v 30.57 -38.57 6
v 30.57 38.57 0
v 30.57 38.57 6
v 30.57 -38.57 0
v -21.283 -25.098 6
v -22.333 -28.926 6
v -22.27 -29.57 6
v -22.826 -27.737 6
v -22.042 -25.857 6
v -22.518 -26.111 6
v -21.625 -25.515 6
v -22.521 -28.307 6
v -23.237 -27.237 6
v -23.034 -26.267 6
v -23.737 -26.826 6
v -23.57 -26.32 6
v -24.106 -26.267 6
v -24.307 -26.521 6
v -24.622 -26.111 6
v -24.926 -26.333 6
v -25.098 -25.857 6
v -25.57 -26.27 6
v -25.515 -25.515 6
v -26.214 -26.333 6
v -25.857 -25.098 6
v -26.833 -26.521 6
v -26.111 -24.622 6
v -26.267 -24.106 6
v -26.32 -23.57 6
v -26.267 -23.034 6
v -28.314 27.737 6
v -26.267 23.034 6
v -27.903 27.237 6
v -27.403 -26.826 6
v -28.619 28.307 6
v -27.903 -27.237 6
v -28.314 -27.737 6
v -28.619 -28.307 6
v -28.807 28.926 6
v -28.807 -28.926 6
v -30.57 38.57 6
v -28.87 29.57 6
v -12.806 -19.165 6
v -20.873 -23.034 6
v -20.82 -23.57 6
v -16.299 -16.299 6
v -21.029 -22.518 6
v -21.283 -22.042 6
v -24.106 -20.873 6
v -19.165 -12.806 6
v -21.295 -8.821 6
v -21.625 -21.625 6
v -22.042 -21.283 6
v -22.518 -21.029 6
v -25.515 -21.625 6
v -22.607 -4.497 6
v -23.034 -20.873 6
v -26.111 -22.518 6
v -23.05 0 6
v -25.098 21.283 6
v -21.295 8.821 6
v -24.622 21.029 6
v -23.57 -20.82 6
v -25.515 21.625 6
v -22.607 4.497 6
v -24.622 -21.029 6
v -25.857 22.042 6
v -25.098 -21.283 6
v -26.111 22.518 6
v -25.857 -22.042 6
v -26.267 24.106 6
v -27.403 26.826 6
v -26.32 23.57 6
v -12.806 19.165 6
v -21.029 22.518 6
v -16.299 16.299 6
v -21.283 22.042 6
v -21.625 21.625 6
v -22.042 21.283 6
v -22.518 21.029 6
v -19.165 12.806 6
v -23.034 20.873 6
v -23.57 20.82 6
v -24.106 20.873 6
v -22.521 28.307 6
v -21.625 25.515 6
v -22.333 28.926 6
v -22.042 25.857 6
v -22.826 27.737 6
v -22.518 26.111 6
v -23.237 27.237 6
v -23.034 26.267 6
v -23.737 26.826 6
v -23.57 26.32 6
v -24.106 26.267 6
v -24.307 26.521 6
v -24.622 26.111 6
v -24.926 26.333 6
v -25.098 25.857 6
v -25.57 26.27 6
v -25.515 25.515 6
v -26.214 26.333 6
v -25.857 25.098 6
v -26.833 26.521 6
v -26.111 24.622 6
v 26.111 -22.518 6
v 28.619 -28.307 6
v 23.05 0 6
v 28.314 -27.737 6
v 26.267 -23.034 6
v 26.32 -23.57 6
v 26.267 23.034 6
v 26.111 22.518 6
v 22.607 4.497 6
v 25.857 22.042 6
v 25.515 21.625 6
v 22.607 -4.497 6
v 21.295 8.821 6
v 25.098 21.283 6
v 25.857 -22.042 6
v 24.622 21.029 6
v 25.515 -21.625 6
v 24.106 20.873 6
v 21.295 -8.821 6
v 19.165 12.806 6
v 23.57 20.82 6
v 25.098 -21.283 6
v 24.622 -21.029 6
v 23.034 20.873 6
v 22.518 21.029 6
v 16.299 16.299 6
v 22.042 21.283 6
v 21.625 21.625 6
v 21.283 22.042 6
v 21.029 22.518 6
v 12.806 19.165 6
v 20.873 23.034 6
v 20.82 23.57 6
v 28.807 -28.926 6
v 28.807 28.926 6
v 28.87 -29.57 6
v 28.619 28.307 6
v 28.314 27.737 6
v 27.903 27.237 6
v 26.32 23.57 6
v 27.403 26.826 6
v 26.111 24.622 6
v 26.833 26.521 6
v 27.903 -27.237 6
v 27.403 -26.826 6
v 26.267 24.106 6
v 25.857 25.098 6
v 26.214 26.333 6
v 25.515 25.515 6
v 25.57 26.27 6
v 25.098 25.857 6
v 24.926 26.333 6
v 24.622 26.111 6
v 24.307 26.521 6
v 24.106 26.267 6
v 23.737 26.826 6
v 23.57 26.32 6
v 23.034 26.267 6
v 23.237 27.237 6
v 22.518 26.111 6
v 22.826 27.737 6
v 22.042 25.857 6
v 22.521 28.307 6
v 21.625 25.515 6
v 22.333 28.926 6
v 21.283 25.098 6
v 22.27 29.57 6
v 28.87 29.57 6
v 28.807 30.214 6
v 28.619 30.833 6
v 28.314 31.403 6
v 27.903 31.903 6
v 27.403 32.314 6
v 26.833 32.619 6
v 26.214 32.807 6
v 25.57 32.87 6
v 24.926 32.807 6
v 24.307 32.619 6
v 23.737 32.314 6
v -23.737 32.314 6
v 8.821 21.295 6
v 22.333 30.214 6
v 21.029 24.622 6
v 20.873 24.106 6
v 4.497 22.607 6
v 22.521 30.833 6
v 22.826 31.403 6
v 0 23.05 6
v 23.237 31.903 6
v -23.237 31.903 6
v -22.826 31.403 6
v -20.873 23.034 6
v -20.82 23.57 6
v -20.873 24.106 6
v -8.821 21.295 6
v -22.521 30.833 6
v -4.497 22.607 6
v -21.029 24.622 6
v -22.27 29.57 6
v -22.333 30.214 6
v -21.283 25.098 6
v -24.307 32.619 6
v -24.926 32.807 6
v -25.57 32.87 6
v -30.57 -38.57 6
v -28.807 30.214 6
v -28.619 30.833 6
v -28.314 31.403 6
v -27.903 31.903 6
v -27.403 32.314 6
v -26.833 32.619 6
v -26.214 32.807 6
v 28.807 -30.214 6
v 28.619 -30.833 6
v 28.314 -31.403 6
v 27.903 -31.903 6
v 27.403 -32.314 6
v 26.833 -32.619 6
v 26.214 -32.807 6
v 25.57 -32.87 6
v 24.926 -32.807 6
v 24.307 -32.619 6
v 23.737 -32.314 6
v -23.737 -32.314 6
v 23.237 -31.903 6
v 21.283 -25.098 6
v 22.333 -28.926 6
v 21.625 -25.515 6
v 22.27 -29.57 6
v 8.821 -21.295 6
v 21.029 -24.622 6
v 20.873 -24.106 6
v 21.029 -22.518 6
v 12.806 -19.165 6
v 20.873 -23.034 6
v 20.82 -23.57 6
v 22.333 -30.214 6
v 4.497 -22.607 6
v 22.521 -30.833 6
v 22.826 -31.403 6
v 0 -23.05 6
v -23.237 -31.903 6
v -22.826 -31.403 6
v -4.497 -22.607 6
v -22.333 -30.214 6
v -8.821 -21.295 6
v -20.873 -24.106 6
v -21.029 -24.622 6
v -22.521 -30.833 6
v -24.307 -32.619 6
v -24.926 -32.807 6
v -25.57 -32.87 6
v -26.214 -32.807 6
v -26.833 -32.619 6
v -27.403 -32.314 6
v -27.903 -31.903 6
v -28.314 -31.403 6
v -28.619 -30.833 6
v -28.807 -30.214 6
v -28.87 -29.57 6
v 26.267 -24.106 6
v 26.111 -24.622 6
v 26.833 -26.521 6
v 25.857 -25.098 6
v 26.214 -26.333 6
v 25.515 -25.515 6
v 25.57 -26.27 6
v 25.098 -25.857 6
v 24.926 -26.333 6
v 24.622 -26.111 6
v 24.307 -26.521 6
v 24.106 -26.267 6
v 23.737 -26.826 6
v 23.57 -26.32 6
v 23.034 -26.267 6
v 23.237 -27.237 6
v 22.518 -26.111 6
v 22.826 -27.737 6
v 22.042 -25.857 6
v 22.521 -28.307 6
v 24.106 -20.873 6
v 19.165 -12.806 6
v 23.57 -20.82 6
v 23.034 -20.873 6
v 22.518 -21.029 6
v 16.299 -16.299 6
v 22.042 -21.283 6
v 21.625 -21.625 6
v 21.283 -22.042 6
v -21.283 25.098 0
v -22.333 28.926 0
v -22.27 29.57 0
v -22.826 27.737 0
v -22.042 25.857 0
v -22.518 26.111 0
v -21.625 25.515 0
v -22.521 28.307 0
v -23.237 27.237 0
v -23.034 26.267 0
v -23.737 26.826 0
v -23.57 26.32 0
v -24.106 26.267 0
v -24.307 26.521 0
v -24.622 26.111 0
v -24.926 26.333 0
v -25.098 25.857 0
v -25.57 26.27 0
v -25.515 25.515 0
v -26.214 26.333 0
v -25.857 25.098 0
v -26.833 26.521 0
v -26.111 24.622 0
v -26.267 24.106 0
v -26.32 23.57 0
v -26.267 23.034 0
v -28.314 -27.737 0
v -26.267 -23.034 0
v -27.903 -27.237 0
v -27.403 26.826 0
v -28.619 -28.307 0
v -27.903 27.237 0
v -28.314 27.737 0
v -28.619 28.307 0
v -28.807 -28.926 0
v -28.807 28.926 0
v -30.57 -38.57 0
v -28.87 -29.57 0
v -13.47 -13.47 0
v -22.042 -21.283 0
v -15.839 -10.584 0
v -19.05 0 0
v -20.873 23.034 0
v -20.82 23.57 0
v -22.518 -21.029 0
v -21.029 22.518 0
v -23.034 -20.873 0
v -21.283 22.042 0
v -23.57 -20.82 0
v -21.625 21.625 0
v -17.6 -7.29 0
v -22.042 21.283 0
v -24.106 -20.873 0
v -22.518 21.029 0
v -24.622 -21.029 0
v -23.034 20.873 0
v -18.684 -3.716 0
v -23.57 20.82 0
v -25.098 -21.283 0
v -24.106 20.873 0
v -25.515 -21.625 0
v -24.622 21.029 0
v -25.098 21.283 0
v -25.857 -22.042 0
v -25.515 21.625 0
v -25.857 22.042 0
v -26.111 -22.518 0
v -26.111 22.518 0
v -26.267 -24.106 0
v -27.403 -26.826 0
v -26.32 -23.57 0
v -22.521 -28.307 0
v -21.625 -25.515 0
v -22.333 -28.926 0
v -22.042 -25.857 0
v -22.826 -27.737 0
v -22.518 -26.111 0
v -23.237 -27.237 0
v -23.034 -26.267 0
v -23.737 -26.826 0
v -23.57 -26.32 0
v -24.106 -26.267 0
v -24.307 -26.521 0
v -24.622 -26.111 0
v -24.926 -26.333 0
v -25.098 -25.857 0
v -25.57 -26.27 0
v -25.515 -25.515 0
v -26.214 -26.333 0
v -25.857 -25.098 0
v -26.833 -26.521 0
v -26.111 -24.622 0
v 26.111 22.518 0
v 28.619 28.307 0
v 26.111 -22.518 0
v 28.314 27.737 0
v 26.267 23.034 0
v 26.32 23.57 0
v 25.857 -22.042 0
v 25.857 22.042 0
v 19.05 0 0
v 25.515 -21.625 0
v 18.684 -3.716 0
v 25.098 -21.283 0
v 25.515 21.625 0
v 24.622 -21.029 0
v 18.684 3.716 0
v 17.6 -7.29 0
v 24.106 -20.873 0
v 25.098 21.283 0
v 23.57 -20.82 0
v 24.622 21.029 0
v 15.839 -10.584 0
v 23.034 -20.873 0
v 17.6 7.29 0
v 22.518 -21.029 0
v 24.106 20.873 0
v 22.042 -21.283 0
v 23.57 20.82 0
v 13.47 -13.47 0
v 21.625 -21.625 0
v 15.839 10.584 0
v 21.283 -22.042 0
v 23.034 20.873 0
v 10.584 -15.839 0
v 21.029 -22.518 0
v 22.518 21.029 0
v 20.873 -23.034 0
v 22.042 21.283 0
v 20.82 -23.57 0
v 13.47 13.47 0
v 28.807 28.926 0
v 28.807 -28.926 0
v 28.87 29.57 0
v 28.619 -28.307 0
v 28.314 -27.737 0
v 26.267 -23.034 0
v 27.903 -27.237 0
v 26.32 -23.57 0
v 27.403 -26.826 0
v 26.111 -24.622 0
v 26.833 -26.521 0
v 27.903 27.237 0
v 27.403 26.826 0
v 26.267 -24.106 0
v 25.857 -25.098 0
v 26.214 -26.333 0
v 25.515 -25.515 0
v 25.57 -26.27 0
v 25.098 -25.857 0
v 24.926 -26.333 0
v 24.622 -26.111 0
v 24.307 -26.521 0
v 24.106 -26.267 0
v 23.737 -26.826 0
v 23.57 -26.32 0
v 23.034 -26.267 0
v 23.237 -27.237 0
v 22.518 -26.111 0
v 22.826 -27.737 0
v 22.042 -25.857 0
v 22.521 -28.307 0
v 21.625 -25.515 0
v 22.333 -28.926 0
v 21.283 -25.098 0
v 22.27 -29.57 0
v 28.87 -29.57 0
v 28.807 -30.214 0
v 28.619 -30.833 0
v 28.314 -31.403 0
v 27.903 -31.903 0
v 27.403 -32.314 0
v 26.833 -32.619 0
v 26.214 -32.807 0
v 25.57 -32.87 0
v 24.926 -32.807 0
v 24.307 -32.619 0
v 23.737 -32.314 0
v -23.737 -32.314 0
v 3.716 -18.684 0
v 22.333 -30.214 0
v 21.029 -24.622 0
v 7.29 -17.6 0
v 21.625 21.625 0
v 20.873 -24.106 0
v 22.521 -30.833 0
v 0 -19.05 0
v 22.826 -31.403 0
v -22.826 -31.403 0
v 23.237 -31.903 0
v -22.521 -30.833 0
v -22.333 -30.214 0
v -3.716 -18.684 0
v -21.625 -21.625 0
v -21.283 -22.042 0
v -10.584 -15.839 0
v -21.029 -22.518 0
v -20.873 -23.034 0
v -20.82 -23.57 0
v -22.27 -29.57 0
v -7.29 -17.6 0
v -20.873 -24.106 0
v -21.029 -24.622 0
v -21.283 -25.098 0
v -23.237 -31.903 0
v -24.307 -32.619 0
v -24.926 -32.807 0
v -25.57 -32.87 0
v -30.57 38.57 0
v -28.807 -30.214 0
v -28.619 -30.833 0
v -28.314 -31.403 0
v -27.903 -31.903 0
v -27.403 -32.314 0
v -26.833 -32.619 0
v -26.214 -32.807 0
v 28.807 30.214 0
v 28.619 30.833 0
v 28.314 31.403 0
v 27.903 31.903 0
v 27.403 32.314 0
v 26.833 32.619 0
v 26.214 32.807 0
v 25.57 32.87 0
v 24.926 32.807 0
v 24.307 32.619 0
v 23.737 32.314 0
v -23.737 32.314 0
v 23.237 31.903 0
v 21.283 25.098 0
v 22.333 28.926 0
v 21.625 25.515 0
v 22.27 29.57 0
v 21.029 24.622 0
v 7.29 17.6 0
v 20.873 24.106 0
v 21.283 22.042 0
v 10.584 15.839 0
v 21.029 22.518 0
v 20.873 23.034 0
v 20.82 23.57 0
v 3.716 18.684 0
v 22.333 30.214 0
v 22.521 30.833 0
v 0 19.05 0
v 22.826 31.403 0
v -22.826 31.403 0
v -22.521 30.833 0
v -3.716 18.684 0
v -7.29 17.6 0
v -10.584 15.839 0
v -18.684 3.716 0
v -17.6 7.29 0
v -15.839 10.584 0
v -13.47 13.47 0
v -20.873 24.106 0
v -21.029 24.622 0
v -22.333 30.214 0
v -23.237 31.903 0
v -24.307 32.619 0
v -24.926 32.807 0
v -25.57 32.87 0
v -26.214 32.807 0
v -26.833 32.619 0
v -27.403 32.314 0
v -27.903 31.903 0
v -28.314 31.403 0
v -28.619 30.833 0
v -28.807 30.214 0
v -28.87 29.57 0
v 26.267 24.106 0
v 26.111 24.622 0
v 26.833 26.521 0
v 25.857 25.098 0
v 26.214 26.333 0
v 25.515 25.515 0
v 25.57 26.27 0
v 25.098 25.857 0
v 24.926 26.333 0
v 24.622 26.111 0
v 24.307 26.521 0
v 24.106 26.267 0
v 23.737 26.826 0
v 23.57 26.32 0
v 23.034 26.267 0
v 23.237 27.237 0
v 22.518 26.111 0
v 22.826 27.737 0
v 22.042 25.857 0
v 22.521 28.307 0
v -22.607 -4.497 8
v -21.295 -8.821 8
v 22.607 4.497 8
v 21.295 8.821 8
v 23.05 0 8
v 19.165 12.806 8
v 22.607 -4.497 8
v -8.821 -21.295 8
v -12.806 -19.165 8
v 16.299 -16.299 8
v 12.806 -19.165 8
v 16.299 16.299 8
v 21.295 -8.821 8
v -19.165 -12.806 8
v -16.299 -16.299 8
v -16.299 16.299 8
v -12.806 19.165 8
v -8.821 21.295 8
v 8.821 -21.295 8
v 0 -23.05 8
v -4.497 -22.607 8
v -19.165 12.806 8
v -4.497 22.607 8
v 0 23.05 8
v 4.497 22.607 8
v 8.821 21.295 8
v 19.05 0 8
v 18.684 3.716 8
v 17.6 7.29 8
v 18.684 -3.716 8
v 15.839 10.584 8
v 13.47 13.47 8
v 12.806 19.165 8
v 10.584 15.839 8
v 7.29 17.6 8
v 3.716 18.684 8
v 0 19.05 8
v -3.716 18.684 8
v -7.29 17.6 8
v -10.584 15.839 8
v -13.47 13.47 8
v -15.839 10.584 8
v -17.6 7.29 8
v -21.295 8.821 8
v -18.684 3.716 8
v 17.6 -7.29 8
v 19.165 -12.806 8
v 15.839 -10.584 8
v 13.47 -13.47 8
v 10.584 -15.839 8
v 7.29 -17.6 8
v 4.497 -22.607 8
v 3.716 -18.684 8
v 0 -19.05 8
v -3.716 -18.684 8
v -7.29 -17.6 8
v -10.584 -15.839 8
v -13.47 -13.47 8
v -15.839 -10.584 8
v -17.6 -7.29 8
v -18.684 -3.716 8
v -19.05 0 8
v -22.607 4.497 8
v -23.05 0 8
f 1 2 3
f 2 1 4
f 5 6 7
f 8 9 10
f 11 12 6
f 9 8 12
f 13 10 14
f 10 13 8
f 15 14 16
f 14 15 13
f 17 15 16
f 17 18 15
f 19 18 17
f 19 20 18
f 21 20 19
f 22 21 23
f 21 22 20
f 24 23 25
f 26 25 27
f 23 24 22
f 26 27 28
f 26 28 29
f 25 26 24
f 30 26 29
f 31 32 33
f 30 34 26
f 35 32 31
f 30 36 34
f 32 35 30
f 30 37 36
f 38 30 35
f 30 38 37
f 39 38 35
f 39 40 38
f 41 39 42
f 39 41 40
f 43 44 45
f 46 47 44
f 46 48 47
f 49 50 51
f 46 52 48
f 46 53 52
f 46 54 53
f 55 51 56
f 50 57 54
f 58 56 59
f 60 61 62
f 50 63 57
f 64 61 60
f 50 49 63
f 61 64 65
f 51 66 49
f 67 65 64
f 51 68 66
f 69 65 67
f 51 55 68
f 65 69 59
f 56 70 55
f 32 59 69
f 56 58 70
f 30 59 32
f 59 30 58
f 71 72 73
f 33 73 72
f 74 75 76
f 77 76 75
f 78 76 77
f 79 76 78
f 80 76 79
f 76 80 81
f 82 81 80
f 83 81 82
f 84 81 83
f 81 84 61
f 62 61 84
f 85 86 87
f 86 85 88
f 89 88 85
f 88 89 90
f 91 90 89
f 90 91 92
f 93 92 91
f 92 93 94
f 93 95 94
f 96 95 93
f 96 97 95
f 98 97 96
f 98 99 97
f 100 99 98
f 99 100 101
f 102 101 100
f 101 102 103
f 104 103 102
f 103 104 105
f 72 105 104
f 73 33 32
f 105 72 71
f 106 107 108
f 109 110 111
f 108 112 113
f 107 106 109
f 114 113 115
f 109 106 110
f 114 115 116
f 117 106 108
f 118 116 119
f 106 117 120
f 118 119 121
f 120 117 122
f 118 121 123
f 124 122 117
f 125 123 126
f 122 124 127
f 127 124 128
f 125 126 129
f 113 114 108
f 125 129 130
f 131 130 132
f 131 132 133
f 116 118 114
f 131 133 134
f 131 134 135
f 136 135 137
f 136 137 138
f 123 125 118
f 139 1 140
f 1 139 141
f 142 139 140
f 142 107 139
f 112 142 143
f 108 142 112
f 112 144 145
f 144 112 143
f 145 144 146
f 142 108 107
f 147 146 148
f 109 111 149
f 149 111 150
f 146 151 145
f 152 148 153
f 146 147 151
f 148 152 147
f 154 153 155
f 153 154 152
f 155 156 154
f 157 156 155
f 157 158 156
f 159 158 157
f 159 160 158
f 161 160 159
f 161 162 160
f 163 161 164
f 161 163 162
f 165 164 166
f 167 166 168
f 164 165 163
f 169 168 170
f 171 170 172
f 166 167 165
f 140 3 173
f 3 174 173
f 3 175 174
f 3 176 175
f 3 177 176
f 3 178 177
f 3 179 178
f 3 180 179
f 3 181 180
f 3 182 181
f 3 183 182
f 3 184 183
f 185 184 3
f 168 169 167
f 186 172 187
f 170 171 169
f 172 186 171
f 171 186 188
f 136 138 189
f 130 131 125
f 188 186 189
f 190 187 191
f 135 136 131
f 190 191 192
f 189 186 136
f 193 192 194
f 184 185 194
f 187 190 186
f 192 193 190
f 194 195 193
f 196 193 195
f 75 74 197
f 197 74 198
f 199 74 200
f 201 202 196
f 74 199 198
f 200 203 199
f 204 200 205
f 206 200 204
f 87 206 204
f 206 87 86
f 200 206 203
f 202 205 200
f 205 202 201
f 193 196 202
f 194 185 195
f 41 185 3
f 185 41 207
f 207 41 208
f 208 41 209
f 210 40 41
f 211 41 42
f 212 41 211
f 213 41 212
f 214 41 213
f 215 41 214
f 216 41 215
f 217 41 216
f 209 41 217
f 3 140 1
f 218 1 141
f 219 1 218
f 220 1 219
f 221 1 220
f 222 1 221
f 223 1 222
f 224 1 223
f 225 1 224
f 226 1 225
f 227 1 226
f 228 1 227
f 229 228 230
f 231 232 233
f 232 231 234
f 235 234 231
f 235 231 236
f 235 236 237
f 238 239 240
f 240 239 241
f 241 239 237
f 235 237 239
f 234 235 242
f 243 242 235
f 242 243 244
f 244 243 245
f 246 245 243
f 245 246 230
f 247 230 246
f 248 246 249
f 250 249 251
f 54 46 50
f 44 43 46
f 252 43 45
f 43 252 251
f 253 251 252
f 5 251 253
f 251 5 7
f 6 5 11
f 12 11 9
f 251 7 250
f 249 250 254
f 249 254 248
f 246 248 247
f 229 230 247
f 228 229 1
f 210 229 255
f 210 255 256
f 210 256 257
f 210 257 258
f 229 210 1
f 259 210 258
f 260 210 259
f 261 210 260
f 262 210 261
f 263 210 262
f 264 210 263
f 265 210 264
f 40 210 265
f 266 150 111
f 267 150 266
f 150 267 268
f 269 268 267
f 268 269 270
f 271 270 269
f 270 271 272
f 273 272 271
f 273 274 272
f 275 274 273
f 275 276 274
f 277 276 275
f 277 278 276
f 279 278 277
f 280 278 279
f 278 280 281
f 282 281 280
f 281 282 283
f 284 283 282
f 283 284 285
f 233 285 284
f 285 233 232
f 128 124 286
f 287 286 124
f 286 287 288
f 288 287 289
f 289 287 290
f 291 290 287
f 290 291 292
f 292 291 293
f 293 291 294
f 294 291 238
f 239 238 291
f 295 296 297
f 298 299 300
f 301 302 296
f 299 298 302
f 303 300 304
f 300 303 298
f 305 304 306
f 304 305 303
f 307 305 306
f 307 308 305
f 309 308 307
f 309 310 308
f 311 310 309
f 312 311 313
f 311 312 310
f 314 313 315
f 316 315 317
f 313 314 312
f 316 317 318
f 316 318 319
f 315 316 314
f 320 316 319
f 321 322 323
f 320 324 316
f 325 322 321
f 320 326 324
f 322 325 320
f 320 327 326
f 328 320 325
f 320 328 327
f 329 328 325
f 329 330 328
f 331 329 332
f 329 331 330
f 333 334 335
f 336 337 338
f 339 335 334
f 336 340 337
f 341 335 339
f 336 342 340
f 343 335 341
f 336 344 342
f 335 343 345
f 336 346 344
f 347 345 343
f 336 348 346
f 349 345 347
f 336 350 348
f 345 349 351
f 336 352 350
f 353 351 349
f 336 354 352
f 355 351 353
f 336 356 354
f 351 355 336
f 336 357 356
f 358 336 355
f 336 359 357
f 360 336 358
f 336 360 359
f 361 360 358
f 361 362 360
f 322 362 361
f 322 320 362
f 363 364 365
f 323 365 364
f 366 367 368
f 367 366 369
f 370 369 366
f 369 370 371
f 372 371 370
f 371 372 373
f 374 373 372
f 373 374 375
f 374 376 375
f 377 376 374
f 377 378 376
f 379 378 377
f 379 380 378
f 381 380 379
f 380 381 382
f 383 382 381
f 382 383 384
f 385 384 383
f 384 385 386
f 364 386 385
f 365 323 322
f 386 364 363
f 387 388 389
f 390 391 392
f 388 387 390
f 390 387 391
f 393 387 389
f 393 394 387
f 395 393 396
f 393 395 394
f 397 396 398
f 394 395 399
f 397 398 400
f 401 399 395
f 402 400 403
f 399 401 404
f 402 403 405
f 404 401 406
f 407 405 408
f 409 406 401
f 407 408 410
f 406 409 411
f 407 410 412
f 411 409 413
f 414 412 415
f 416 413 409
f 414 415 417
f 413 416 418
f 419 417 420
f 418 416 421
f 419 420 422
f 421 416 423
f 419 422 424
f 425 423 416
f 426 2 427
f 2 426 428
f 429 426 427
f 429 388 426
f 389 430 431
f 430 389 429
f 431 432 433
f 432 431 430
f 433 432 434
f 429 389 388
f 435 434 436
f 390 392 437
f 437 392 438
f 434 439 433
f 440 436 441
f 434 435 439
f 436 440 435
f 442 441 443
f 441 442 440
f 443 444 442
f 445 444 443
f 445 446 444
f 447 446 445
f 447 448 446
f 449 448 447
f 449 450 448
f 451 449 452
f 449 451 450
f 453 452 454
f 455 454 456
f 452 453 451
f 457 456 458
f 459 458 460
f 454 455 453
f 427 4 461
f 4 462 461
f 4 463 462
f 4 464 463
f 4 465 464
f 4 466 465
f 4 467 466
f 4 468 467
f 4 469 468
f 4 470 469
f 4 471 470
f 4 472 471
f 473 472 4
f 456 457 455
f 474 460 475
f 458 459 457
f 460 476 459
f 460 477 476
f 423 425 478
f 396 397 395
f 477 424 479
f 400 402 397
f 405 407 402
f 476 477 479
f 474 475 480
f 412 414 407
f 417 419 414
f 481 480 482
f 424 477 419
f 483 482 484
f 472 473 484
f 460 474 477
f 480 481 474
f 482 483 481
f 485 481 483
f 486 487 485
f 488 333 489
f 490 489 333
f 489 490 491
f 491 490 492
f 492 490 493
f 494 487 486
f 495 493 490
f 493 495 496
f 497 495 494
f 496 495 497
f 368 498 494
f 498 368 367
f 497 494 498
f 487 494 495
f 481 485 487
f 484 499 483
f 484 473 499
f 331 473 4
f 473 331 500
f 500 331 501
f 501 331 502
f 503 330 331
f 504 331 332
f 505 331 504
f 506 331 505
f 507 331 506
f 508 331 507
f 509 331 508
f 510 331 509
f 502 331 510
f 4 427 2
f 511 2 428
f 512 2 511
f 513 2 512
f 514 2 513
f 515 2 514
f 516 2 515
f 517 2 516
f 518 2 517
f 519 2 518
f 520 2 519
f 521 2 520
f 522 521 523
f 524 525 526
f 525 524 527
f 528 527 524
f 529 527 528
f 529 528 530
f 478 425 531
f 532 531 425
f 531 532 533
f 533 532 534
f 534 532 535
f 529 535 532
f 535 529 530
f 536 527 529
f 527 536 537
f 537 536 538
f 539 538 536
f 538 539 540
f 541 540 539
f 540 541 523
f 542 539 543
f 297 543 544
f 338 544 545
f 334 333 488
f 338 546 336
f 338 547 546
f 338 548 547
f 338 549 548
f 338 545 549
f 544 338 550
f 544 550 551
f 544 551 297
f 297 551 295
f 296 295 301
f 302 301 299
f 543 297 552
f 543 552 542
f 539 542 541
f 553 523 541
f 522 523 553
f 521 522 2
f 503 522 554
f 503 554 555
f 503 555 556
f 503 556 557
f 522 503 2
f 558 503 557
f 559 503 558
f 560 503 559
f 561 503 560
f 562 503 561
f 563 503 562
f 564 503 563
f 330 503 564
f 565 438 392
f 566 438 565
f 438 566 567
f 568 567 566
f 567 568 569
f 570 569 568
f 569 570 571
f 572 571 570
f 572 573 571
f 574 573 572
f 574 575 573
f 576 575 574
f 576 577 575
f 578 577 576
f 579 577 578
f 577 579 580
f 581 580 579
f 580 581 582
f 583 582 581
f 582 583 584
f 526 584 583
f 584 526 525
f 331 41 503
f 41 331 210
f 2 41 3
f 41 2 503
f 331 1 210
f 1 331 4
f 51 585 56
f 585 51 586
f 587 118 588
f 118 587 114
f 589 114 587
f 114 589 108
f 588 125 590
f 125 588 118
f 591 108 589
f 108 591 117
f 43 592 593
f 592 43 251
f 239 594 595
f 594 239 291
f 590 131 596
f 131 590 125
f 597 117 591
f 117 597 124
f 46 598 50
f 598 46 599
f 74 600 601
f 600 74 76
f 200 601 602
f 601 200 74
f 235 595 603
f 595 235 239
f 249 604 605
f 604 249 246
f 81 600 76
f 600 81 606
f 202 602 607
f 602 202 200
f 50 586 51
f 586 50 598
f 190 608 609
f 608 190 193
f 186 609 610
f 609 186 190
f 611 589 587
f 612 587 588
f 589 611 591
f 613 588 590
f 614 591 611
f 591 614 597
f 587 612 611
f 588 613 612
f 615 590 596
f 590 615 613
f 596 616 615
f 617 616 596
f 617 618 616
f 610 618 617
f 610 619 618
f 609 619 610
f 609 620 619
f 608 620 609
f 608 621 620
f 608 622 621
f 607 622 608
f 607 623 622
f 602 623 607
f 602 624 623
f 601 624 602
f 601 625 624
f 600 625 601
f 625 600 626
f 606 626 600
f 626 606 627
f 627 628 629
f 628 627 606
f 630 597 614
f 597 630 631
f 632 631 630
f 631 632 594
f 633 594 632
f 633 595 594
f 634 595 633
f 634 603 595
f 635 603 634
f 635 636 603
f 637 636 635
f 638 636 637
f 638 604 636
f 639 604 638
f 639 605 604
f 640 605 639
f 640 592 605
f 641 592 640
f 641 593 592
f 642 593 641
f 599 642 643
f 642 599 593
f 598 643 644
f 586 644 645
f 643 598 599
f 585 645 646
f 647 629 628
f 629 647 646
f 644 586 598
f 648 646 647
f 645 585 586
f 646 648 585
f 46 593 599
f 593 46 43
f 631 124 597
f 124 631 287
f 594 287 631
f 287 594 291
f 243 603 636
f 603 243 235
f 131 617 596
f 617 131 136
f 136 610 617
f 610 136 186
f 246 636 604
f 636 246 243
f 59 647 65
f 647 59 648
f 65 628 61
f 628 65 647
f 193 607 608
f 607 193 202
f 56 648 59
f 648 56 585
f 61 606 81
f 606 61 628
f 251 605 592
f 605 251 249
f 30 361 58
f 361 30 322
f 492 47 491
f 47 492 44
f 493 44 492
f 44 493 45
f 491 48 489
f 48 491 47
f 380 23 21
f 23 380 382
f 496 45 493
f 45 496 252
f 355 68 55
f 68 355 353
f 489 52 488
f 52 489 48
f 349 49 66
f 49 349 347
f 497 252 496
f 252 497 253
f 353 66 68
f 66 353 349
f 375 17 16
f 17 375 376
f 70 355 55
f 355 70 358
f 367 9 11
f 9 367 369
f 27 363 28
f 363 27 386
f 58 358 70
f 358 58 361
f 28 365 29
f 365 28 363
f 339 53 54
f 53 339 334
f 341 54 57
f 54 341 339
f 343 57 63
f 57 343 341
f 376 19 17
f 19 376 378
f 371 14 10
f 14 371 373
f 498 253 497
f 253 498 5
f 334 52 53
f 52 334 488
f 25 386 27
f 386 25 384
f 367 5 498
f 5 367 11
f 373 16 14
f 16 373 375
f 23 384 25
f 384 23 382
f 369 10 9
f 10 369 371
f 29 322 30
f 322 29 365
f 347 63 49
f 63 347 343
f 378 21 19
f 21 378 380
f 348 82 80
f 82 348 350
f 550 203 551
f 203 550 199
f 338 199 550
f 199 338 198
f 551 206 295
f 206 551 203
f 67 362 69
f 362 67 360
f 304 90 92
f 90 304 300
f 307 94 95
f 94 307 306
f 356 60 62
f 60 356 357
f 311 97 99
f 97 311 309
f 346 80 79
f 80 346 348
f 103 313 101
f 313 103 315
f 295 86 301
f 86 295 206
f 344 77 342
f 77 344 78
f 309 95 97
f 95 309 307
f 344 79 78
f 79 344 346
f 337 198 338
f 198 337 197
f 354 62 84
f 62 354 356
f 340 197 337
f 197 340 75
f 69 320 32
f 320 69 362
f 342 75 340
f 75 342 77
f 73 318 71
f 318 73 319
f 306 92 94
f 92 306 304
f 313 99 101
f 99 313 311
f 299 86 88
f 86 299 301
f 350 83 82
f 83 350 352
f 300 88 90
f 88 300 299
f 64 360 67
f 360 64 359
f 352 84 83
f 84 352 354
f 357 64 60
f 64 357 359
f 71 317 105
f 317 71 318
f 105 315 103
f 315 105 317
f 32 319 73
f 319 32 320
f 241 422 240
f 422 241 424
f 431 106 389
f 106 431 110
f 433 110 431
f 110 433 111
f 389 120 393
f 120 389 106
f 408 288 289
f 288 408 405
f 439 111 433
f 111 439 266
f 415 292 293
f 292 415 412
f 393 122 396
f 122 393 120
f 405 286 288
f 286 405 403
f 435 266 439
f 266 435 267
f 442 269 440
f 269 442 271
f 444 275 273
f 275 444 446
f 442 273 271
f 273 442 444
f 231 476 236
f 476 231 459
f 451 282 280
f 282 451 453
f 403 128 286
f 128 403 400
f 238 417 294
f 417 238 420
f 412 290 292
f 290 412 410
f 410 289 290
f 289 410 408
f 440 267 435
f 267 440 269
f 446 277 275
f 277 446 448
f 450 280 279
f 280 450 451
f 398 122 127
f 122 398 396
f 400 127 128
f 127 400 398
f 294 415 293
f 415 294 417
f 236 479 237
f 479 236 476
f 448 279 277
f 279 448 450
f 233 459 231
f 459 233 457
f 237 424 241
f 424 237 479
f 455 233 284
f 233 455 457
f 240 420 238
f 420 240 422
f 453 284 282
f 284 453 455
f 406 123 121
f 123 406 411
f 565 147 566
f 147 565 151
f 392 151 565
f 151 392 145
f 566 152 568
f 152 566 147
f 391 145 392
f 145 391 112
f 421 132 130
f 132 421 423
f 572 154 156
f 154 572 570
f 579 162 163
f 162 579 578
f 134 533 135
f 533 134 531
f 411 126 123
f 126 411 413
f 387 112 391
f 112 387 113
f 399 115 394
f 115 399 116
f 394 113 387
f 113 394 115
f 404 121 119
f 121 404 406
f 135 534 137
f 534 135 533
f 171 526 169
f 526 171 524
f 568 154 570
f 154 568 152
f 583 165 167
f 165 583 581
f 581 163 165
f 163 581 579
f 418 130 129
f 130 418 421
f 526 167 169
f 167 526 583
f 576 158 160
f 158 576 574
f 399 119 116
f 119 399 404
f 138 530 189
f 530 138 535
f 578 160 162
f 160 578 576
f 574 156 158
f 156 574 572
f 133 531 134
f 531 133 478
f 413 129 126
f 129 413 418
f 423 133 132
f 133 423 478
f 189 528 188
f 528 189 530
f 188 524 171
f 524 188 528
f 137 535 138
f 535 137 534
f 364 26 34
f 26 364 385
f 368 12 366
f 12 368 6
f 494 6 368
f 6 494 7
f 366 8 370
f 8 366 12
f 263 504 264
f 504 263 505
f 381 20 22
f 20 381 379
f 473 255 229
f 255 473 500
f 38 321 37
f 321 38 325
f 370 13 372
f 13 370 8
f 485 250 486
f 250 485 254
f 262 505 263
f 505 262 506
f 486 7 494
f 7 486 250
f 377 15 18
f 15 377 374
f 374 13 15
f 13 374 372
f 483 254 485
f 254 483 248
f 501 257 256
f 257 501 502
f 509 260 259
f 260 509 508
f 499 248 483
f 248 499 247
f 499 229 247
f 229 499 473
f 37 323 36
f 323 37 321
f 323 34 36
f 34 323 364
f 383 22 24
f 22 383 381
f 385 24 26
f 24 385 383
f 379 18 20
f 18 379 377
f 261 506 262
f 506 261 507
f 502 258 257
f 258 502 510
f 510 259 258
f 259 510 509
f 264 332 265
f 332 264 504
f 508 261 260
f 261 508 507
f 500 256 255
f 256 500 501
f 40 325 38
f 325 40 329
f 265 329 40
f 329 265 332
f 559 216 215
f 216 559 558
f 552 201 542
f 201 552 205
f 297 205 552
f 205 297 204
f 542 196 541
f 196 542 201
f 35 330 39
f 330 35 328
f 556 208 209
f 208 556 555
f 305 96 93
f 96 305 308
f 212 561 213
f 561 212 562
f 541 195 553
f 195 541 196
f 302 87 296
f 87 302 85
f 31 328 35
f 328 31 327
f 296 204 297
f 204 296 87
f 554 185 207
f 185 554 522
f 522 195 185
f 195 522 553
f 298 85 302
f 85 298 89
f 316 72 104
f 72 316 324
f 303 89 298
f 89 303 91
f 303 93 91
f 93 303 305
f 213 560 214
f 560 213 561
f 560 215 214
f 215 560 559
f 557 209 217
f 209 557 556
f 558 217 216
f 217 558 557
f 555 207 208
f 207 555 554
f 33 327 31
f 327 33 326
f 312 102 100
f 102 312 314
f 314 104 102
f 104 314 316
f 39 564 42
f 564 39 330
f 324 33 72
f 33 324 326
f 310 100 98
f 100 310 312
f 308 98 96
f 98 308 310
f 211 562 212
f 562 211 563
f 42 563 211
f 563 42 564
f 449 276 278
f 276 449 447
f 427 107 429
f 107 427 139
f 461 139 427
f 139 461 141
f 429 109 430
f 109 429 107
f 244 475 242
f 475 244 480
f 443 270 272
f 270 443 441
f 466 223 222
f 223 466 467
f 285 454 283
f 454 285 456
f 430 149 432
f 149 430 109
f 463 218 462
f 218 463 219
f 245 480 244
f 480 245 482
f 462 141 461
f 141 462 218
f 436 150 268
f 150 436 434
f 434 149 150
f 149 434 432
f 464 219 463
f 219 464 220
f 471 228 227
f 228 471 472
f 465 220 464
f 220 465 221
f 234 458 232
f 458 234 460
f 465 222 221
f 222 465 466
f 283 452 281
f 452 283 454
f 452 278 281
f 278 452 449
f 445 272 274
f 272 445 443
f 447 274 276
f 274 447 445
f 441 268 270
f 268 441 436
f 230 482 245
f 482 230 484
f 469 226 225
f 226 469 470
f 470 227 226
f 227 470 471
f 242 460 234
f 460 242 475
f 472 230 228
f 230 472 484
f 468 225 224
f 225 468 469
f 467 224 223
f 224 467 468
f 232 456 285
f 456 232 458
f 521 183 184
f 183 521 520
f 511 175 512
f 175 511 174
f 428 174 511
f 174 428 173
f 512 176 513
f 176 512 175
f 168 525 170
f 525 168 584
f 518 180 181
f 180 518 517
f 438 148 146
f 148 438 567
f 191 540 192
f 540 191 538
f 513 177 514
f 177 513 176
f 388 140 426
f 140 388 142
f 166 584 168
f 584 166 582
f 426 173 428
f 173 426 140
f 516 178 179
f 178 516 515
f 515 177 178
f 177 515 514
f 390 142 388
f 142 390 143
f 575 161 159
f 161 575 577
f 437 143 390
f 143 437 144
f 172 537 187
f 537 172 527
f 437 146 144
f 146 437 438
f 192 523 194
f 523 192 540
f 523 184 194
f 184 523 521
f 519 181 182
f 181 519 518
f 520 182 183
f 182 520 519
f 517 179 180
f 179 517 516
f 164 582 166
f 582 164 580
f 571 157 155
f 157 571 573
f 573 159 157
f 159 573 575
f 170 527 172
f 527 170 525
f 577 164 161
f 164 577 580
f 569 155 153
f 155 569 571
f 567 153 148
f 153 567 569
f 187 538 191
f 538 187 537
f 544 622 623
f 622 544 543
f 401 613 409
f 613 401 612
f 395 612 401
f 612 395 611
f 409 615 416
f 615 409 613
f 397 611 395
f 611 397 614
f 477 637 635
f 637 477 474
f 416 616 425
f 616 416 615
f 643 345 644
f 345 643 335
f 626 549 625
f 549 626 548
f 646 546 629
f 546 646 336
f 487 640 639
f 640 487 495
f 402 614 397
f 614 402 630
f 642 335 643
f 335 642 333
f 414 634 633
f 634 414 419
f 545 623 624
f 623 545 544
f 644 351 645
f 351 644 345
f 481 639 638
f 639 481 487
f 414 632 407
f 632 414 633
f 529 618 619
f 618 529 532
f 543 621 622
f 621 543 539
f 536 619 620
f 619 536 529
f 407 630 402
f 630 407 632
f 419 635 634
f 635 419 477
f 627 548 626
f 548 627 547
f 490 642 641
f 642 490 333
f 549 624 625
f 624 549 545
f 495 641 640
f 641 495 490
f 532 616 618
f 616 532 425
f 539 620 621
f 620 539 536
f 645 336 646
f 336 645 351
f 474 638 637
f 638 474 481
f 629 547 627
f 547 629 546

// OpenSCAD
$fn = 32;

// ----------------------------------------------------------------------
// Motor mount plate: NEMA23, 61.14 x 77.14 x 8 mm
// ----------------------------------------------------------------------

// --- parameters (mm) ---
plate_w = 61.14;          // plate length, X
plate_d = 77.14;          // plate width, Y
plate_t = 6;              // plate thickness
pattern = 47.14;          // NEMA23 bolt spacing
motor_d = 5.5;            // NEMA23 screw clearance
pilot_d = 38.1;           // pilot boss bore
boss_d = 46.1;            // raised pilot ring
boss_h = 2;               // raised pilot ring height
second_d = 6.6;           // second fastener hole

module plate() {
  translate([-plate_w / 2, -plate_d / 2, 0]) cube([plate_w, plate_d, plate_t]);
}

module motor_holes() {
  for (sx = [-1, 1]) for (sy = [-1, 1])
    translate([sx * pattern / 2, sy * pattern / 2, -1])
      cylinder(h = plate_t + 2, d = motor_d);
}
module pilot_ring() {
  translate([0, 0, plate_t - 1]) cylinder(h = boss_h + 1, d = boss_d);
}

difference() {
  union() {
    plate();
    pilot_ring();
  }
  motor_holes();
  translate([0, 0, -1]) cylinder(h = plate_t + boss_h + 2, d = pilot_d);
  for (sx = [-1, 1]) for (sy = [-1, 1])
    translate([sx * 25.57, sy * 29.57, -1]) cylinder(h = plate_t + 2, d = second_d);
}
